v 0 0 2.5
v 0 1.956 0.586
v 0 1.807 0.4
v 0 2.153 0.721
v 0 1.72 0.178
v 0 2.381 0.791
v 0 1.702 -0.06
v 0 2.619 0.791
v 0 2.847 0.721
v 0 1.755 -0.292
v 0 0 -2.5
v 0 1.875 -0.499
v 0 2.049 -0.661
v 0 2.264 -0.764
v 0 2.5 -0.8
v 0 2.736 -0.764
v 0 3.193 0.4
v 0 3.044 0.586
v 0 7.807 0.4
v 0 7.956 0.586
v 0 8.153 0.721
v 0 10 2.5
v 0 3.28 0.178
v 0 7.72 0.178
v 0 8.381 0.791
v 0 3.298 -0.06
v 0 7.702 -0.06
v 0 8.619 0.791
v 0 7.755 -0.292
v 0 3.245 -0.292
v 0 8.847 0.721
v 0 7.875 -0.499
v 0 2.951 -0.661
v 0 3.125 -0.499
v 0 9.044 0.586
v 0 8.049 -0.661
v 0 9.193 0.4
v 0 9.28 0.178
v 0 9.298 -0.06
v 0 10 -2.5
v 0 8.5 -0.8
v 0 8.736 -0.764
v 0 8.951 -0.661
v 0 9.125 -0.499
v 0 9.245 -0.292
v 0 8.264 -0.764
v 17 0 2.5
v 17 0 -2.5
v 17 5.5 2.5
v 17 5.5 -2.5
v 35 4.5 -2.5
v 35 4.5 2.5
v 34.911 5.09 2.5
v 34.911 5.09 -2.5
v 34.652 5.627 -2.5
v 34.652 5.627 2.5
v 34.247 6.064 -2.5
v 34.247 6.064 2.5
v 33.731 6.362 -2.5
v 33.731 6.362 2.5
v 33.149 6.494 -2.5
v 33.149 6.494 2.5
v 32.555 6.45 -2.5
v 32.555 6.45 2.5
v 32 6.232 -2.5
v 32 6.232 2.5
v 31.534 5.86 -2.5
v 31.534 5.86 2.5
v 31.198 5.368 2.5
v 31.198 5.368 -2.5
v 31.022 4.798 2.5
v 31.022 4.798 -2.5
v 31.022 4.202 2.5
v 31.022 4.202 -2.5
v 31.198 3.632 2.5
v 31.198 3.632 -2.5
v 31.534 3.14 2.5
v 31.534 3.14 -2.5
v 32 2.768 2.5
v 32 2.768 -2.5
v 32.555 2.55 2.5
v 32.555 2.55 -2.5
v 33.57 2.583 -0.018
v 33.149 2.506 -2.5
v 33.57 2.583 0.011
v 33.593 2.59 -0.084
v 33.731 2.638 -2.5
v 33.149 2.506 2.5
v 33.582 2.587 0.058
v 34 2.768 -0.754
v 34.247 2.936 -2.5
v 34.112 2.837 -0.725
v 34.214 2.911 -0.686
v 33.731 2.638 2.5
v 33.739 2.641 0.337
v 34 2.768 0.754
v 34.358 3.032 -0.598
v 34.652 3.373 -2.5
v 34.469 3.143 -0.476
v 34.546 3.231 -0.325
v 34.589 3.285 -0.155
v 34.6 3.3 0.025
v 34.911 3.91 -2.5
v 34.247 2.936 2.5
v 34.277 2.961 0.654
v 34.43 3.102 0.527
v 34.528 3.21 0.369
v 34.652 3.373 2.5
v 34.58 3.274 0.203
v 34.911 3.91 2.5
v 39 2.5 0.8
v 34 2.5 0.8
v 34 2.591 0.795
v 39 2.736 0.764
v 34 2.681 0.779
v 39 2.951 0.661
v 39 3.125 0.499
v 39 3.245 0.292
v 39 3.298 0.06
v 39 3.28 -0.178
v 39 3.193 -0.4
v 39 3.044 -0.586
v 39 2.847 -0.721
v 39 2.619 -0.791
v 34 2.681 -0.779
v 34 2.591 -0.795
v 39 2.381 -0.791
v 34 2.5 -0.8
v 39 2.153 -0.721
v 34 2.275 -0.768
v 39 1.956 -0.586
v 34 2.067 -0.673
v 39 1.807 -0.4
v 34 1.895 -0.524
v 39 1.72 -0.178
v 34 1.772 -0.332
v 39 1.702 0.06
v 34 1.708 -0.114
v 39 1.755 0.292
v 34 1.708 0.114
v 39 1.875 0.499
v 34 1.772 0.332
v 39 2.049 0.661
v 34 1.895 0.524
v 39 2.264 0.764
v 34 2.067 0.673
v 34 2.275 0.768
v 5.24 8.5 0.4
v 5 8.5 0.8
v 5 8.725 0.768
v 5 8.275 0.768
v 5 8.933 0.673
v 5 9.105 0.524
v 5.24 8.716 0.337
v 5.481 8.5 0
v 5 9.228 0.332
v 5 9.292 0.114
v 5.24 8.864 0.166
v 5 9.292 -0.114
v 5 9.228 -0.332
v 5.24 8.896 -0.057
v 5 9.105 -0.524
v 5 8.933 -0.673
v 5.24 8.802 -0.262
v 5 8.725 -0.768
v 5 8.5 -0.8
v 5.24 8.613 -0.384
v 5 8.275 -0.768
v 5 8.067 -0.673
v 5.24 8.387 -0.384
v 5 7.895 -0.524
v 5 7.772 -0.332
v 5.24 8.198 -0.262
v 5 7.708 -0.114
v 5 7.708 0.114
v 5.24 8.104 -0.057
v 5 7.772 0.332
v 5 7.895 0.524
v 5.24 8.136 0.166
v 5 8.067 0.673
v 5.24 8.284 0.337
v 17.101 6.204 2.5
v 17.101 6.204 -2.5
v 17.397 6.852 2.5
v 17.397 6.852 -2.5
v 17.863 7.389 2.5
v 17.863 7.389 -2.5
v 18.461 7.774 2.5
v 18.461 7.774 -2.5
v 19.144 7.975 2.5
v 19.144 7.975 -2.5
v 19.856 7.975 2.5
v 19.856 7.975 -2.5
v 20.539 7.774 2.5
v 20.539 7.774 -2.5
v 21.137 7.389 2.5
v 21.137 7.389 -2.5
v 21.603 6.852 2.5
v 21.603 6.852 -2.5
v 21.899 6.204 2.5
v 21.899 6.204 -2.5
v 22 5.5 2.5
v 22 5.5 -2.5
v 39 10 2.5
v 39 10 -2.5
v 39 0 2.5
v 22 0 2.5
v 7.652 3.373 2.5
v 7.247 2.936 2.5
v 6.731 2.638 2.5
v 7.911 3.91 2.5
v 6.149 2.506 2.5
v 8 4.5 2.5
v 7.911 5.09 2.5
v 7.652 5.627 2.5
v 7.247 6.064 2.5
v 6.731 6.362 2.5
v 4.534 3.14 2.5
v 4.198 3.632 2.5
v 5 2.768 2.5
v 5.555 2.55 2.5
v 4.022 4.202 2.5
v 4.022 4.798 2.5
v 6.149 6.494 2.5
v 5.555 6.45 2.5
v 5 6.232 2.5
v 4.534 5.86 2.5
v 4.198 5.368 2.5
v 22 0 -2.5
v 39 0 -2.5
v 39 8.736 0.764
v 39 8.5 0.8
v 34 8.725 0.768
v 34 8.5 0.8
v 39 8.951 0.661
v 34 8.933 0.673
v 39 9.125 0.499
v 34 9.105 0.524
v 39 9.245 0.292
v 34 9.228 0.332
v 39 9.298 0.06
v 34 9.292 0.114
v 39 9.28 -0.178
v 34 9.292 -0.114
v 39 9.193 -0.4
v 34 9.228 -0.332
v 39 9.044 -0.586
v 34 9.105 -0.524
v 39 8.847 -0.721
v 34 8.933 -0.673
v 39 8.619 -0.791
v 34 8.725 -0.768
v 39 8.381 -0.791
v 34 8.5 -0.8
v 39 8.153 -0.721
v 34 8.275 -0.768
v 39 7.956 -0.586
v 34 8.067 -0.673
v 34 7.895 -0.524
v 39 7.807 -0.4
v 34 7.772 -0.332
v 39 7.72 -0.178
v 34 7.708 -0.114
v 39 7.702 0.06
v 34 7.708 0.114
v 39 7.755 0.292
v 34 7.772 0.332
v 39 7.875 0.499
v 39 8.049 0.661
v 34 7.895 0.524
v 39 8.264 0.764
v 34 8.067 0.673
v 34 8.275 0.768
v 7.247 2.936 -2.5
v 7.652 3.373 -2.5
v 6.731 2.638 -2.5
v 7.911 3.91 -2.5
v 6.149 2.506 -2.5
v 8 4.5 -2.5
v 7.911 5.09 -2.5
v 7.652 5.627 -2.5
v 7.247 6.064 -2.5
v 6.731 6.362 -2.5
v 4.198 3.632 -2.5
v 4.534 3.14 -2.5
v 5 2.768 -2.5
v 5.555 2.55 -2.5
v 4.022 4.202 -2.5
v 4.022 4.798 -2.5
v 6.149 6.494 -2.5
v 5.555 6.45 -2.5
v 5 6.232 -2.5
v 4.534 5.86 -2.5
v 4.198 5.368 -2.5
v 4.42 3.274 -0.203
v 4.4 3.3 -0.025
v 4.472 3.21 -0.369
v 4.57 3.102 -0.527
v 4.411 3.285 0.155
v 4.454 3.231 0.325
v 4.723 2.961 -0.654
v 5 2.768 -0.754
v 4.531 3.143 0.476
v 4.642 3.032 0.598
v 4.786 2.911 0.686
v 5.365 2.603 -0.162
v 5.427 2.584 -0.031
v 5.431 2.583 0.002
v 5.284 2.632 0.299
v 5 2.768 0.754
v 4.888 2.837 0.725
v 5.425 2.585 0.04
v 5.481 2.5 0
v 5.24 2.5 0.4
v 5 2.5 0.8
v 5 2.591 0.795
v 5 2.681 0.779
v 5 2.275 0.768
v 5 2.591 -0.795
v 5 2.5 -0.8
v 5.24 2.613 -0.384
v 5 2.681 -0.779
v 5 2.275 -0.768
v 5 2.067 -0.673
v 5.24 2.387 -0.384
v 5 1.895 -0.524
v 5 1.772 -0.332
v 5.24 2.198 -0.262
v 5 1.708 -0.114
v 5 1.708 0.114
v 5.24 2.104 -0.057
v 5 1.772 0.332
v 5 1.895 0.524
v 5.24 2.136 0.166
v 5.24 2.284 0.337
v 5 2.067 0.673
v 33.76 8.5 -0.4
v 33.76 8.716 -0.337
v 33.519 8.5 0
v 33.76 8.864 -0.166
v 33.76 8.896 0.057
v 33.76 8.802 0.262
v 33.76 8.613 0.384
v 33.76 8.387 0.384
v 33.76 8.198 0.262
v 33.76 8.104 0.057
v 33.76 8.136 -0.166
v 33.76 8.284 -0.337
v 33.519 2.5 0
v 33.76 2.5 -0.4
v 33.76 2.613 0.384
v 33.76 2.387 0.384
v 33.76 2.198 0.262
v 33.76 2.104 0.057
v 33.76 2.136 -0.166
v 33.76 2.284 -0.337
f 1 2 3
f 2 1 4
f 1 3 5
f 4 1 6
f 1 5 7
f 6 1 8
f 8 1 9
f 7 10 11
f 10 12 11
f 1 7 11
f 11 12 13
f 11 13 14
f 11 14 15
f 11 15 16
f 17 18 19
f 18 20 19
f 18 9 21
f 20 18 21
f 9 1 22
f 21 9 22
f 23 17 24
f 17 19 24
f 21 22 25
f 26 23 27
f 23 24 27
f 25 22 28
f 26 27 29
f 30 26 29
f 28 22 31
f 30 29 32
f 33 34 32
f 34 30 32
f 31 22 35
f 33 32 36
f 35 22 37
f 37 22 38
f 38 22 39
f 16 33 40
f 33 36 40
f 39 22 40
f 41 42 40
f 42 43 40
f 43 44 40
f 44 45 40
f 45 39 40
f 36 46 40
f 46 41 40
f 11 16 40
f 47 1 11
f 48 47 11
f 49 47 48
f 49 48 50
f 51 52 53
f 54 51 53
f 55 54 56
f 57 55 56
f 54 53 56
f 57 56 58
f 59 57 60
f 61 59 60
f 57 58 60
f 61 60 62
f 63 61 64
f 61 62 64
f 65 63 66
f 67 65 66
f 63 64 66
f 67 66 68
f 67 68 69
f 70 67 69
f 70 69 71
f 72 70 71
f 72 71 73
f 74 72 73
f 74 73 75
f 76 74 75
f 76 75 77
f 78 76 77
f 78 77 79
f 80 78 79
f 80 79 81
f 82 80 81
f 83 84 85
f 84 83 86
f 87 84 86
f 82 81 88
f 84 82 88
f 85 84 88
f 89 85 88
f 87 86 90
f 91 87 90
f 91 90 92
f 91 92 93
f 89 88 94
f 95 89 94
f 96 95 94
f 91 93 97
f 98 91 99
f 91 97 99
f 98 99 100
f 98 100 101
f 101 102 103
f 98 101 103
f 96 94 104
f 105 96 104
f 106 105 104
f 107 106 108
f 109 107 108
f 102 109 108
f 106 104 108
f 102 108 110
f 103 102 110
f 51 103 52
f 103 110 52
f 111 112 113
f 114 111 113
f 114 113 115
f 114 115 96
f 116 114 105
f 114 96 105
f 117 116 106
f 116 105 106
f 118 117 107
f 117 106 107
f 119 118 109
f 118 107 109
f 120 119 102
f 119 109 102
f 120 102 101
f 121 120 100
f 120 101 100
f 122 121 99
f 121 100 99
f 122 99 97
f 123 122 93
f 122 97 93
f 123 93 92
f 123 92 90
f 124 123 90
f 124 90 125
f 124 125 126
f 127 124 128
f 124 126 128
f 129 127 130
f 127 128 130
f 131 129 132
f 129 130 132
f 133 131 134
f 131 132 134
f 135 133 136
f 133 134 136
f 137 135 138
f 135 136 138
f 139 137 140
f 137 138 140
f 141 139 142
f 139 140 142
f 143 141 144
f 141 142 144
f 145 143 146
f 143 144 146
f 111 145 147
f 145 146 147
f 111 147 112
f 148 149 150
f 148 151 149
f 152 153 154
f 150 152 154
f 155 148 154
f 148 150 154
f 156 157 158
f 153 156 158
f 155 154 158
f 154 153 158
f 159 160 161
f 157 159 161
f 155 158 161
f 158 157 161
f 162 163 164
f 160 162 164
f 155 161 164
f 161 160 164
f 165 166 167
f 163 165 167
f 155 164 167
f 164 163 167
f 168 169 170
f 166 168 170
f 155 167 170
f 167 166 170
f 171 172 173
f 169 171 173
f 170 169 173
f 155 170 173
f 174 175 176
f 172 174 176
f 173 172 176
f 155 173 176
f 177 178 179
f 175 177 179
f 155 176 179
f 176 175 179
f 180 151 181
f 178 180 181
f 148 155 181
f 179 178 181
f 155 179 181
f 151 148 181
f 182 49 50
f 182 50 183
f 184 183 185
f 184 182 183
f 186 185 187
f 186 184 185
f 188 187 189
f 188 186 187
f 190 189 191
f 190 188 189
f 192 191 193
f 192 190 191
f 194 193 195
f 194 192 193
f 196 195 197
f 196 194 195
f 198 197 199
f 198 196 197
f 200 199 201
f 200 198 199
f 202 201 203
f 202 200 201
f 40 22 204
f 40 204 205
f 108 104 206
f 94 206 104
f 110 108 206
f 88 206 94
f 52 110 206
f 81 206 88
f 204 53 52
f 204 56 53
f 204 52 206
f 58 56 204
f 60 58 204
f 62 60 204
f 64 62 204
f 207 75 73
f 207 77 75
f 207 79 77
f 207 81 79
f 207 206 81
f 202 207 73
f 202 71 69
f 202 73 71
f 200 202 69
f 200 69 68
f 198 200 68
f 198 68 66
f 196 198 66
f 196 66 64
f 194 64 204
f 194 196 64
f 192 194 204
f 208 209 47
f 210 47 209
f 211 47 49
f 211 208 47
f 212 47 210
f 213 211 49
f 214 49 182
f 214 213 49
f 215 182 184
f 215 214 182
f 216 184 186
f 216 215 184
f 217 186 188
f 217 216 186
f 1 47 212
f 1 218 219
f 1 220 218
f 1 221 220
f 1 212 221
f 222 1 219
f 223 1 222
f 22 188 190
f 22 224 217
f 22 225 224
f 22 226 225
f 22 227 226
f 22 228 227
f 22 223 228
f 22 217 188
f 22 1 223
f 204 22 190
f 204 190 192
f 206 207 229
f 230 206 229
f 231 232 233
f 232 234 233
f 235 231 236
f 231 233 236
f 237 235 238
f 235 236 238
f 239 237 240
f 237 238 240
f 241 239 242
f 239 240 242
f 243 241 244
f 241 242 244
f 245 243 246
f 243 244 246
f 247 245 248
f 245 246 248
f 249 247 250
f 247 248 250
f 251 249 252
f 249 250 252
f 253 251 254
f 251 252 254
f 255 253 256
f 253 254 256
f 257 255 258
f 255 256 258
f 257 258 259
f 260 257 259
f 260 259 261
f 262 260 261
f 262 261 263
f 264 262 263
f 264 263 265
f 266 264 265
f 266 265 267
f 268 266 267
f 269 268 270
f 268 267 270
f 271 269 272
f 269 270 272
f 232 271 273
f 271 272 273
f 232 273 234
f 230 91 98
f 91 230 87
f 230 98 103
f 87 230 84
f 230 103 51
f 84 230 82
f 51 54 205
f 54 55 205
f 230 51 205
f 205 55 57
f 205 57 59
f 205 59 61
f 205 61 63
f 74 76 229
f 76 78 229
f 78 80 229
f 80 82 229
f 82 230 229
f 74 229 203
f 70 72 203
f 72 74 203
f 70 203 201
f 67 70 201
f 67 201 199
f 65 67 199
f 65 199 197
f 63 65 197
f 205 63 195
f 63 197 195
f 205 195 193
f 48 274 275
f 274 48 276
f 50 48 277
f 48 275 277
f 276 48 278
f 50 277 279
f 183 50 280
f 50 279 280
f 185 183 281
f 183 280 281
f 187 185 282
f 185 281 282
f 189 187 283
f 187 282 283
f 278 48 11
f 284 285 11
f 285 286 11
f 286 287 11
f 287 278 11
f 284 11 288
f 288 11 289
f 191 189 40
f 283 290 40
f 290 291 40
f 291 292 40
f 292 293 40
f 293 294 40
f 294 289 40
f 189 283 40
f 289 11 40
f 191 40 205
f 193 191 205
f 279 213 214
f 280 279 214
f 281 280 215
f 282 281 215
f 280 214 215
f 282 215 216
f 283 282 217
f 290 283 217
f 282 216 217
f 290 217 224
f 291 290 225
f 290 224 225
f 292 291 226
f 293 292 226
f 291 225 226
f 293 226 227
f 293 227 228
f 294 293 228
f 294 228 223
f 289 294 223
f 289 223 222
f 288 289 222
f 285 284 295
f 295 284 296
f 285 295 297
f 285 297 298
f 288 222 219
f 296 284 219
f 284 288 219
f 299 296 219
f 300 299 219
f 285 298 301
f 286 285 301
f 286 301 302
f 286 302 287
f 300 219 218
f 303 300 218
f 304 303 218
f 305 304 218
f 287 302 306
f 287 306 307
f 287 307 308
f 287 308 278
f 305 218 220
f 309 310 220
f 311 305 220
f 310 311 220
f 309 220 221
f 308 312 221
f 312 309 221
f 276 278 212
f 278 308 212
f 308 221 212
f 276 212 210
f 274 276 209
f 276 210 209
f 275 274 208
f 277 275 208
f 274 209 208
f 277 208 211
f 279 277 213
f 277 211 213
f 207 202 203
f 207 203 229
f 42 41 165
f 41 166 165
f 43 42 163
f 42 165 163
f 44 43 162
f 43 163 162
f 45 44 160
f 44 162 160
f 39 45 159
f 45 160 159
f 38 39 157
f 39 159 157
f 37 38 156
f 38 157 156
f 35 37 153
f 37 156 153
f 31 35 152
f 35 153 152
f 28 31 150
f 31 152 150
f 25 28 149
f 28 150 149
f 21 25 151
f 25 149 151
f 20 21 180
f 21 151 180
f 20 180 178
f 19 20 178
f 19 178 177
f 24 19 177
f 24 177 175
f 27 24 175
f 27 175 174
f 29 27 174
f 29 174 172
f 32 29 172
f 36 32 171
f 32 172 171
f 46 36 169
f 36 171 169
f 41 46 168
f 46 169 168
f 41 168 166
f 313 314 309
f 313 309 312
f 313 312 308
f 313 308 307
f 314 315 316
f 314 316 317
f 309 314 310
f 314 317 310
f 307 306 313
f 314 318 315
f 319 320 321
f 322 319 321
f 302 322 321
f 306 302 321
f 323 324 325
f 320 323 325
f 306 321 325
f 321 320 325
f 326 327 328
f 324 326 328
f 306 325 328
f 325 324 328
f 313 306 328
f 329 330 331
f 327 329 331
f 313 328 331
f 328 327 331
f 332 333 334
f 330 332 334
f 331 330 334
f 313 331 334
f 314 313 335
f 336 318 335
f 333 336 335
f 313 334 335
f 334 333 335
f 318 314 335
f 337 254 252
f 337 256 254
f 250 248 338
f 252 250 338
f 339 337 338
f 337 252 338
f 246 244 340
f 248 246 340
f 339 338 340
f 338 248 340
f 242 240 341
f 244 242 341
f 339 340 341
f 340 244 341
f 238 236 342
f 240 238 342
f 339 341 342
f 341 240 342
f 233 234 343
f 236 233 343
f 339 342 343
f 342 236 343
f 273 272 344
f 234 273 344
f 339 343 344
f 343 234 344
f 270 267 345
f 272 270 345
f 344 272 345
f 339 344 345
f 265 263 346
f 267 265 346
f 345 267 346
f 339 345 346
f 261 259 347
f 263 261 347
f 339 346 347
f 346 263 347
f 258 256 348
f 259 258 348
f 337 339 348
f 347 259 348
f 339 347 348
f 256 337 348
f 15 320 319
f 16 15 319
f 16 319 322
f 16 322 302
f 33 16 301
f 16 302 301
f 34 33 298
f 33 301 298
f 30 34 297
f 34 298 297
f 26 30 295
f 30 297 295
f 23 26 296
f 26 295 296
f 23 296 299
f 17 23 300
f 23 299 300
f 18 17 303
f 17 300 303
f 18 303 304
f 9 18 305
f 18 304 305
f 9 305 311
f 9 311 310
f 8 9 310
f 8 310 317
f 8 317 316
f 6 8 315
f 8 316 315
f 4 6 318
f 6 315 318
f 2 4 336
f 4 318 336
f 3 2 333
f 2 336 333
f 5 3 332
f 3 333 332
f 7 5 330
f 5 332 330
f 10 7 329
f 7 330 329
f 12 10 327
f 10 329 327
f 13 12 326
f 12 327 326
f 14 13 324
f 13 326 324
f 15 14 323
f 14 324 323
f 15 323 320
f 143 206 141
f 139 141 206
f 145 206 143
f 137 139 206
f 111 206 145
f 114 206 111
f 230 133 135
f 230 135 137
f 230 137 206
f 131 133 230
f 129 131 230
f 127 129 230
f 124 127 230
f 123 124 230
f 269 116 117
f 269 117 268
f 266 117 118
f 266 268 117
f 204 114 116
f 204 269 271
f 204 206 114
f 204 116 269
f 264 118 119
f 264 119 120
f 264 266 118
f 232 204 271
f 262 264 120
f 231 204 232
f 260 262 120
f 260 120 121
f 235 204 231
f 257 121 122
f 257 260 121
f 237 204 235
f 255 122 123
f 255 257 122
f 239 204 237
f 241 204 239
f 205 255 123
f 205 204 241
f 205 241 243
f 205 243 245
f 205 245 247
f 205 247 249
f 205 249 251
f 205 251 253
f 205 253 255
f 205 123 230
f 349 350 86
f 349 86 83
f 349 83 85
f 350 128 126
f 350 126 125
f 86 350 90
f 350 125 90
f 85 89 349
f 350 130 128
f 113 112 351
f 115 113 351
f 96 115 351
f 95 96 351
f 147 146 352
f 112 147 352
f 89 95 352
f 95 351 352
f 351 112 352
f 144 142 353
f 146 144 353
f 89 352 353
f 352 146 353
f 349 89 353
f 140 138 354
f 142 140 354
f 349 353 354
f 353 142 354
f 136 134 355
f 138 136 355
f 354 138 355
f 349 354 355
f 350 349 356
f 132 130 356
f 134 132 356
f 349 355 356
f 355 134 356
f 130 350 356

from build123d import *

# Parameters (mm, degrees)
SKETCH1_W                       = 5
SKETCH1_H                       = 10
BOSS_EXTRUDE1_DEPTH             = 39
TAP_DRILL_FOR_M2X0_4_TAP1_D     = 1.6
TAP_DRILL_FOR_M2X0_4_TAP1_DEPTH = 5
TAP_DRILL_FOR_M2X0_4_TAP1_TIP   = 0.480688495
TAP_DRILL_FOR_M2X0_4_TAP2_D     = 1.6
TAP_DRILL_FOR_M2X0_4_TAP2_DEPTH = 5
TAP_DRILL_FOR_M2X0_4_TAP2_TIP   = 0.480688495
CUT_EXTRUDE1_REACH              = 7
SKETCH8_R                       = 2


with BuildPart() as part:
    # Sketch1 → Boss-Extrude1 (new body)
    with BuildSketch(Plane(origin=(0, 0, 0), x_dir=(0, 0, -1), z_dir=(1, 0, 0))):
        with Locations((0, 5)):
            Rectangle(SKETCH1_W, SKETCH1_H)
    extrude(amount=BOSS_EXTRUDE1_DEPTH)

    # Tap Drill for M2x0.4 Tap1
    with Locations(Plane(origin=(39, 0, 0), x_dir=(0, 0, -1), z_dir=(1, 0, 0))):
        with Locations((0, 8.5), (0, 2.5)):
            Hole(TAP_DRILL_FOR_M2X0_4_TAP1_D / 2, depth=TAP_DRILL_FOR_M2X0_4_TAP1_DEPTH)
            with Locations((0, 0, -(TAP_DRILL_FOR_M2X0_4_TAP1_DEPTH + TAP_DRILL_FOR_M2X0_4_TAP1_TIP / 2))):  # 118° drill point
                Cone(0, TAP_DRILL_FOR_M2X0_4_TAP1_D / 2, TAP_DRILL_FOR_M2X0_4_TAP1_TIP, mode=Mode.SUBTRACT)

    # Tap Drill for M2x0.4 Tap2
    with Locations(Plane.ZY):
        with Locations((0, 8.5), (0, 2.5)):
            Hole(TAP_DRILL_FOR_M2X0_4_TAP2_D / 2, depth=TAP_DRILL_FOR_M2X0_4_TAP2_DEPTH)
            with Locations((0, 0, -(TAP_DRILL_FOR_M2X0_4_TAP2_DEPTH + TAP_DRILL_FOR_M2X0_4_TAP2_TIP / 2))):  # 118° drill point
                Cone(0, TAP_DRILL_FOR_M2X0_4_TAP2_D / 2, TAP_DRILL_FOR_M2X0_4_TAP2_TIP, mode=Mode.SUBTRACT)

    # Sketch8 → Cut-Extrude1 (cut, up to next)
    with BuildSketch(Plane.XY.offset(2.5), mode=Mode.PRIVATE) as cut_extrude1_sk1:
        with Locations((6, 4.5)):
            Circle(SKETCH8_R)
    cut_extrude1_tool1 = extrude(cut_extrude1_sk1.sketch, amount=-CUT_EXTRUDE1_REACH, mode=Mode.PRIVATE) & part.part
    add(cut_extrude1_tool1.solids().sort_by_distance((6, 4.5, 2.5))[0], mode=Mode.SUBTRACT)
    # Sketch8 → Cut-Extrude1 (cut, up to next)
    with BuildSketch(Plane.XY.offset(2.5), mode=Mode.PRIVATE) as cut_extrude1_sk2:
        with Locations((33, 4.5)):
            Circle(SKETCH8_R)
    cut_extrude1_tool2 = extrude(cut_extrude1_sk2.sketch, amount=-CUT_EXTRUDE1_REACH, mode=Mode.PRIVATE) & part.part
    add(cut_extrude1_tool2.solids().sort_by_distance((33, 4.5, 2.5))[0], mode=Mode.SUBTRACT)
    # Sketch8 → Cut-Extrude1 (cut, up to next)
    with BuildSketch(Plane.XY.offset(2.5), mode=Mode.PRIVATE) as cut_extrude1_sk3:
        with BuildLine():
            Line((17, 0), (17, 5.5))
            ThreePointArc((17, 5.5), (19.5, 8), (22, 5.5))
            Line((22, 5.5), (22, 0))
            Line((22, 0), (17, 0))
        make_face()
    cut_extrude1_tool3 = extrude(cut_extrude1_sk3.sketch, amount=-CUT_EXTRUDE1_REACH, mode=Mode.PRIVATE) & part.part
    add(cut_extrude1_tool3.solids().sort_by_distance((19.5, 3.752606, 2.5))[0], mode=Mode.SUBTRACT)


solid = part.part
